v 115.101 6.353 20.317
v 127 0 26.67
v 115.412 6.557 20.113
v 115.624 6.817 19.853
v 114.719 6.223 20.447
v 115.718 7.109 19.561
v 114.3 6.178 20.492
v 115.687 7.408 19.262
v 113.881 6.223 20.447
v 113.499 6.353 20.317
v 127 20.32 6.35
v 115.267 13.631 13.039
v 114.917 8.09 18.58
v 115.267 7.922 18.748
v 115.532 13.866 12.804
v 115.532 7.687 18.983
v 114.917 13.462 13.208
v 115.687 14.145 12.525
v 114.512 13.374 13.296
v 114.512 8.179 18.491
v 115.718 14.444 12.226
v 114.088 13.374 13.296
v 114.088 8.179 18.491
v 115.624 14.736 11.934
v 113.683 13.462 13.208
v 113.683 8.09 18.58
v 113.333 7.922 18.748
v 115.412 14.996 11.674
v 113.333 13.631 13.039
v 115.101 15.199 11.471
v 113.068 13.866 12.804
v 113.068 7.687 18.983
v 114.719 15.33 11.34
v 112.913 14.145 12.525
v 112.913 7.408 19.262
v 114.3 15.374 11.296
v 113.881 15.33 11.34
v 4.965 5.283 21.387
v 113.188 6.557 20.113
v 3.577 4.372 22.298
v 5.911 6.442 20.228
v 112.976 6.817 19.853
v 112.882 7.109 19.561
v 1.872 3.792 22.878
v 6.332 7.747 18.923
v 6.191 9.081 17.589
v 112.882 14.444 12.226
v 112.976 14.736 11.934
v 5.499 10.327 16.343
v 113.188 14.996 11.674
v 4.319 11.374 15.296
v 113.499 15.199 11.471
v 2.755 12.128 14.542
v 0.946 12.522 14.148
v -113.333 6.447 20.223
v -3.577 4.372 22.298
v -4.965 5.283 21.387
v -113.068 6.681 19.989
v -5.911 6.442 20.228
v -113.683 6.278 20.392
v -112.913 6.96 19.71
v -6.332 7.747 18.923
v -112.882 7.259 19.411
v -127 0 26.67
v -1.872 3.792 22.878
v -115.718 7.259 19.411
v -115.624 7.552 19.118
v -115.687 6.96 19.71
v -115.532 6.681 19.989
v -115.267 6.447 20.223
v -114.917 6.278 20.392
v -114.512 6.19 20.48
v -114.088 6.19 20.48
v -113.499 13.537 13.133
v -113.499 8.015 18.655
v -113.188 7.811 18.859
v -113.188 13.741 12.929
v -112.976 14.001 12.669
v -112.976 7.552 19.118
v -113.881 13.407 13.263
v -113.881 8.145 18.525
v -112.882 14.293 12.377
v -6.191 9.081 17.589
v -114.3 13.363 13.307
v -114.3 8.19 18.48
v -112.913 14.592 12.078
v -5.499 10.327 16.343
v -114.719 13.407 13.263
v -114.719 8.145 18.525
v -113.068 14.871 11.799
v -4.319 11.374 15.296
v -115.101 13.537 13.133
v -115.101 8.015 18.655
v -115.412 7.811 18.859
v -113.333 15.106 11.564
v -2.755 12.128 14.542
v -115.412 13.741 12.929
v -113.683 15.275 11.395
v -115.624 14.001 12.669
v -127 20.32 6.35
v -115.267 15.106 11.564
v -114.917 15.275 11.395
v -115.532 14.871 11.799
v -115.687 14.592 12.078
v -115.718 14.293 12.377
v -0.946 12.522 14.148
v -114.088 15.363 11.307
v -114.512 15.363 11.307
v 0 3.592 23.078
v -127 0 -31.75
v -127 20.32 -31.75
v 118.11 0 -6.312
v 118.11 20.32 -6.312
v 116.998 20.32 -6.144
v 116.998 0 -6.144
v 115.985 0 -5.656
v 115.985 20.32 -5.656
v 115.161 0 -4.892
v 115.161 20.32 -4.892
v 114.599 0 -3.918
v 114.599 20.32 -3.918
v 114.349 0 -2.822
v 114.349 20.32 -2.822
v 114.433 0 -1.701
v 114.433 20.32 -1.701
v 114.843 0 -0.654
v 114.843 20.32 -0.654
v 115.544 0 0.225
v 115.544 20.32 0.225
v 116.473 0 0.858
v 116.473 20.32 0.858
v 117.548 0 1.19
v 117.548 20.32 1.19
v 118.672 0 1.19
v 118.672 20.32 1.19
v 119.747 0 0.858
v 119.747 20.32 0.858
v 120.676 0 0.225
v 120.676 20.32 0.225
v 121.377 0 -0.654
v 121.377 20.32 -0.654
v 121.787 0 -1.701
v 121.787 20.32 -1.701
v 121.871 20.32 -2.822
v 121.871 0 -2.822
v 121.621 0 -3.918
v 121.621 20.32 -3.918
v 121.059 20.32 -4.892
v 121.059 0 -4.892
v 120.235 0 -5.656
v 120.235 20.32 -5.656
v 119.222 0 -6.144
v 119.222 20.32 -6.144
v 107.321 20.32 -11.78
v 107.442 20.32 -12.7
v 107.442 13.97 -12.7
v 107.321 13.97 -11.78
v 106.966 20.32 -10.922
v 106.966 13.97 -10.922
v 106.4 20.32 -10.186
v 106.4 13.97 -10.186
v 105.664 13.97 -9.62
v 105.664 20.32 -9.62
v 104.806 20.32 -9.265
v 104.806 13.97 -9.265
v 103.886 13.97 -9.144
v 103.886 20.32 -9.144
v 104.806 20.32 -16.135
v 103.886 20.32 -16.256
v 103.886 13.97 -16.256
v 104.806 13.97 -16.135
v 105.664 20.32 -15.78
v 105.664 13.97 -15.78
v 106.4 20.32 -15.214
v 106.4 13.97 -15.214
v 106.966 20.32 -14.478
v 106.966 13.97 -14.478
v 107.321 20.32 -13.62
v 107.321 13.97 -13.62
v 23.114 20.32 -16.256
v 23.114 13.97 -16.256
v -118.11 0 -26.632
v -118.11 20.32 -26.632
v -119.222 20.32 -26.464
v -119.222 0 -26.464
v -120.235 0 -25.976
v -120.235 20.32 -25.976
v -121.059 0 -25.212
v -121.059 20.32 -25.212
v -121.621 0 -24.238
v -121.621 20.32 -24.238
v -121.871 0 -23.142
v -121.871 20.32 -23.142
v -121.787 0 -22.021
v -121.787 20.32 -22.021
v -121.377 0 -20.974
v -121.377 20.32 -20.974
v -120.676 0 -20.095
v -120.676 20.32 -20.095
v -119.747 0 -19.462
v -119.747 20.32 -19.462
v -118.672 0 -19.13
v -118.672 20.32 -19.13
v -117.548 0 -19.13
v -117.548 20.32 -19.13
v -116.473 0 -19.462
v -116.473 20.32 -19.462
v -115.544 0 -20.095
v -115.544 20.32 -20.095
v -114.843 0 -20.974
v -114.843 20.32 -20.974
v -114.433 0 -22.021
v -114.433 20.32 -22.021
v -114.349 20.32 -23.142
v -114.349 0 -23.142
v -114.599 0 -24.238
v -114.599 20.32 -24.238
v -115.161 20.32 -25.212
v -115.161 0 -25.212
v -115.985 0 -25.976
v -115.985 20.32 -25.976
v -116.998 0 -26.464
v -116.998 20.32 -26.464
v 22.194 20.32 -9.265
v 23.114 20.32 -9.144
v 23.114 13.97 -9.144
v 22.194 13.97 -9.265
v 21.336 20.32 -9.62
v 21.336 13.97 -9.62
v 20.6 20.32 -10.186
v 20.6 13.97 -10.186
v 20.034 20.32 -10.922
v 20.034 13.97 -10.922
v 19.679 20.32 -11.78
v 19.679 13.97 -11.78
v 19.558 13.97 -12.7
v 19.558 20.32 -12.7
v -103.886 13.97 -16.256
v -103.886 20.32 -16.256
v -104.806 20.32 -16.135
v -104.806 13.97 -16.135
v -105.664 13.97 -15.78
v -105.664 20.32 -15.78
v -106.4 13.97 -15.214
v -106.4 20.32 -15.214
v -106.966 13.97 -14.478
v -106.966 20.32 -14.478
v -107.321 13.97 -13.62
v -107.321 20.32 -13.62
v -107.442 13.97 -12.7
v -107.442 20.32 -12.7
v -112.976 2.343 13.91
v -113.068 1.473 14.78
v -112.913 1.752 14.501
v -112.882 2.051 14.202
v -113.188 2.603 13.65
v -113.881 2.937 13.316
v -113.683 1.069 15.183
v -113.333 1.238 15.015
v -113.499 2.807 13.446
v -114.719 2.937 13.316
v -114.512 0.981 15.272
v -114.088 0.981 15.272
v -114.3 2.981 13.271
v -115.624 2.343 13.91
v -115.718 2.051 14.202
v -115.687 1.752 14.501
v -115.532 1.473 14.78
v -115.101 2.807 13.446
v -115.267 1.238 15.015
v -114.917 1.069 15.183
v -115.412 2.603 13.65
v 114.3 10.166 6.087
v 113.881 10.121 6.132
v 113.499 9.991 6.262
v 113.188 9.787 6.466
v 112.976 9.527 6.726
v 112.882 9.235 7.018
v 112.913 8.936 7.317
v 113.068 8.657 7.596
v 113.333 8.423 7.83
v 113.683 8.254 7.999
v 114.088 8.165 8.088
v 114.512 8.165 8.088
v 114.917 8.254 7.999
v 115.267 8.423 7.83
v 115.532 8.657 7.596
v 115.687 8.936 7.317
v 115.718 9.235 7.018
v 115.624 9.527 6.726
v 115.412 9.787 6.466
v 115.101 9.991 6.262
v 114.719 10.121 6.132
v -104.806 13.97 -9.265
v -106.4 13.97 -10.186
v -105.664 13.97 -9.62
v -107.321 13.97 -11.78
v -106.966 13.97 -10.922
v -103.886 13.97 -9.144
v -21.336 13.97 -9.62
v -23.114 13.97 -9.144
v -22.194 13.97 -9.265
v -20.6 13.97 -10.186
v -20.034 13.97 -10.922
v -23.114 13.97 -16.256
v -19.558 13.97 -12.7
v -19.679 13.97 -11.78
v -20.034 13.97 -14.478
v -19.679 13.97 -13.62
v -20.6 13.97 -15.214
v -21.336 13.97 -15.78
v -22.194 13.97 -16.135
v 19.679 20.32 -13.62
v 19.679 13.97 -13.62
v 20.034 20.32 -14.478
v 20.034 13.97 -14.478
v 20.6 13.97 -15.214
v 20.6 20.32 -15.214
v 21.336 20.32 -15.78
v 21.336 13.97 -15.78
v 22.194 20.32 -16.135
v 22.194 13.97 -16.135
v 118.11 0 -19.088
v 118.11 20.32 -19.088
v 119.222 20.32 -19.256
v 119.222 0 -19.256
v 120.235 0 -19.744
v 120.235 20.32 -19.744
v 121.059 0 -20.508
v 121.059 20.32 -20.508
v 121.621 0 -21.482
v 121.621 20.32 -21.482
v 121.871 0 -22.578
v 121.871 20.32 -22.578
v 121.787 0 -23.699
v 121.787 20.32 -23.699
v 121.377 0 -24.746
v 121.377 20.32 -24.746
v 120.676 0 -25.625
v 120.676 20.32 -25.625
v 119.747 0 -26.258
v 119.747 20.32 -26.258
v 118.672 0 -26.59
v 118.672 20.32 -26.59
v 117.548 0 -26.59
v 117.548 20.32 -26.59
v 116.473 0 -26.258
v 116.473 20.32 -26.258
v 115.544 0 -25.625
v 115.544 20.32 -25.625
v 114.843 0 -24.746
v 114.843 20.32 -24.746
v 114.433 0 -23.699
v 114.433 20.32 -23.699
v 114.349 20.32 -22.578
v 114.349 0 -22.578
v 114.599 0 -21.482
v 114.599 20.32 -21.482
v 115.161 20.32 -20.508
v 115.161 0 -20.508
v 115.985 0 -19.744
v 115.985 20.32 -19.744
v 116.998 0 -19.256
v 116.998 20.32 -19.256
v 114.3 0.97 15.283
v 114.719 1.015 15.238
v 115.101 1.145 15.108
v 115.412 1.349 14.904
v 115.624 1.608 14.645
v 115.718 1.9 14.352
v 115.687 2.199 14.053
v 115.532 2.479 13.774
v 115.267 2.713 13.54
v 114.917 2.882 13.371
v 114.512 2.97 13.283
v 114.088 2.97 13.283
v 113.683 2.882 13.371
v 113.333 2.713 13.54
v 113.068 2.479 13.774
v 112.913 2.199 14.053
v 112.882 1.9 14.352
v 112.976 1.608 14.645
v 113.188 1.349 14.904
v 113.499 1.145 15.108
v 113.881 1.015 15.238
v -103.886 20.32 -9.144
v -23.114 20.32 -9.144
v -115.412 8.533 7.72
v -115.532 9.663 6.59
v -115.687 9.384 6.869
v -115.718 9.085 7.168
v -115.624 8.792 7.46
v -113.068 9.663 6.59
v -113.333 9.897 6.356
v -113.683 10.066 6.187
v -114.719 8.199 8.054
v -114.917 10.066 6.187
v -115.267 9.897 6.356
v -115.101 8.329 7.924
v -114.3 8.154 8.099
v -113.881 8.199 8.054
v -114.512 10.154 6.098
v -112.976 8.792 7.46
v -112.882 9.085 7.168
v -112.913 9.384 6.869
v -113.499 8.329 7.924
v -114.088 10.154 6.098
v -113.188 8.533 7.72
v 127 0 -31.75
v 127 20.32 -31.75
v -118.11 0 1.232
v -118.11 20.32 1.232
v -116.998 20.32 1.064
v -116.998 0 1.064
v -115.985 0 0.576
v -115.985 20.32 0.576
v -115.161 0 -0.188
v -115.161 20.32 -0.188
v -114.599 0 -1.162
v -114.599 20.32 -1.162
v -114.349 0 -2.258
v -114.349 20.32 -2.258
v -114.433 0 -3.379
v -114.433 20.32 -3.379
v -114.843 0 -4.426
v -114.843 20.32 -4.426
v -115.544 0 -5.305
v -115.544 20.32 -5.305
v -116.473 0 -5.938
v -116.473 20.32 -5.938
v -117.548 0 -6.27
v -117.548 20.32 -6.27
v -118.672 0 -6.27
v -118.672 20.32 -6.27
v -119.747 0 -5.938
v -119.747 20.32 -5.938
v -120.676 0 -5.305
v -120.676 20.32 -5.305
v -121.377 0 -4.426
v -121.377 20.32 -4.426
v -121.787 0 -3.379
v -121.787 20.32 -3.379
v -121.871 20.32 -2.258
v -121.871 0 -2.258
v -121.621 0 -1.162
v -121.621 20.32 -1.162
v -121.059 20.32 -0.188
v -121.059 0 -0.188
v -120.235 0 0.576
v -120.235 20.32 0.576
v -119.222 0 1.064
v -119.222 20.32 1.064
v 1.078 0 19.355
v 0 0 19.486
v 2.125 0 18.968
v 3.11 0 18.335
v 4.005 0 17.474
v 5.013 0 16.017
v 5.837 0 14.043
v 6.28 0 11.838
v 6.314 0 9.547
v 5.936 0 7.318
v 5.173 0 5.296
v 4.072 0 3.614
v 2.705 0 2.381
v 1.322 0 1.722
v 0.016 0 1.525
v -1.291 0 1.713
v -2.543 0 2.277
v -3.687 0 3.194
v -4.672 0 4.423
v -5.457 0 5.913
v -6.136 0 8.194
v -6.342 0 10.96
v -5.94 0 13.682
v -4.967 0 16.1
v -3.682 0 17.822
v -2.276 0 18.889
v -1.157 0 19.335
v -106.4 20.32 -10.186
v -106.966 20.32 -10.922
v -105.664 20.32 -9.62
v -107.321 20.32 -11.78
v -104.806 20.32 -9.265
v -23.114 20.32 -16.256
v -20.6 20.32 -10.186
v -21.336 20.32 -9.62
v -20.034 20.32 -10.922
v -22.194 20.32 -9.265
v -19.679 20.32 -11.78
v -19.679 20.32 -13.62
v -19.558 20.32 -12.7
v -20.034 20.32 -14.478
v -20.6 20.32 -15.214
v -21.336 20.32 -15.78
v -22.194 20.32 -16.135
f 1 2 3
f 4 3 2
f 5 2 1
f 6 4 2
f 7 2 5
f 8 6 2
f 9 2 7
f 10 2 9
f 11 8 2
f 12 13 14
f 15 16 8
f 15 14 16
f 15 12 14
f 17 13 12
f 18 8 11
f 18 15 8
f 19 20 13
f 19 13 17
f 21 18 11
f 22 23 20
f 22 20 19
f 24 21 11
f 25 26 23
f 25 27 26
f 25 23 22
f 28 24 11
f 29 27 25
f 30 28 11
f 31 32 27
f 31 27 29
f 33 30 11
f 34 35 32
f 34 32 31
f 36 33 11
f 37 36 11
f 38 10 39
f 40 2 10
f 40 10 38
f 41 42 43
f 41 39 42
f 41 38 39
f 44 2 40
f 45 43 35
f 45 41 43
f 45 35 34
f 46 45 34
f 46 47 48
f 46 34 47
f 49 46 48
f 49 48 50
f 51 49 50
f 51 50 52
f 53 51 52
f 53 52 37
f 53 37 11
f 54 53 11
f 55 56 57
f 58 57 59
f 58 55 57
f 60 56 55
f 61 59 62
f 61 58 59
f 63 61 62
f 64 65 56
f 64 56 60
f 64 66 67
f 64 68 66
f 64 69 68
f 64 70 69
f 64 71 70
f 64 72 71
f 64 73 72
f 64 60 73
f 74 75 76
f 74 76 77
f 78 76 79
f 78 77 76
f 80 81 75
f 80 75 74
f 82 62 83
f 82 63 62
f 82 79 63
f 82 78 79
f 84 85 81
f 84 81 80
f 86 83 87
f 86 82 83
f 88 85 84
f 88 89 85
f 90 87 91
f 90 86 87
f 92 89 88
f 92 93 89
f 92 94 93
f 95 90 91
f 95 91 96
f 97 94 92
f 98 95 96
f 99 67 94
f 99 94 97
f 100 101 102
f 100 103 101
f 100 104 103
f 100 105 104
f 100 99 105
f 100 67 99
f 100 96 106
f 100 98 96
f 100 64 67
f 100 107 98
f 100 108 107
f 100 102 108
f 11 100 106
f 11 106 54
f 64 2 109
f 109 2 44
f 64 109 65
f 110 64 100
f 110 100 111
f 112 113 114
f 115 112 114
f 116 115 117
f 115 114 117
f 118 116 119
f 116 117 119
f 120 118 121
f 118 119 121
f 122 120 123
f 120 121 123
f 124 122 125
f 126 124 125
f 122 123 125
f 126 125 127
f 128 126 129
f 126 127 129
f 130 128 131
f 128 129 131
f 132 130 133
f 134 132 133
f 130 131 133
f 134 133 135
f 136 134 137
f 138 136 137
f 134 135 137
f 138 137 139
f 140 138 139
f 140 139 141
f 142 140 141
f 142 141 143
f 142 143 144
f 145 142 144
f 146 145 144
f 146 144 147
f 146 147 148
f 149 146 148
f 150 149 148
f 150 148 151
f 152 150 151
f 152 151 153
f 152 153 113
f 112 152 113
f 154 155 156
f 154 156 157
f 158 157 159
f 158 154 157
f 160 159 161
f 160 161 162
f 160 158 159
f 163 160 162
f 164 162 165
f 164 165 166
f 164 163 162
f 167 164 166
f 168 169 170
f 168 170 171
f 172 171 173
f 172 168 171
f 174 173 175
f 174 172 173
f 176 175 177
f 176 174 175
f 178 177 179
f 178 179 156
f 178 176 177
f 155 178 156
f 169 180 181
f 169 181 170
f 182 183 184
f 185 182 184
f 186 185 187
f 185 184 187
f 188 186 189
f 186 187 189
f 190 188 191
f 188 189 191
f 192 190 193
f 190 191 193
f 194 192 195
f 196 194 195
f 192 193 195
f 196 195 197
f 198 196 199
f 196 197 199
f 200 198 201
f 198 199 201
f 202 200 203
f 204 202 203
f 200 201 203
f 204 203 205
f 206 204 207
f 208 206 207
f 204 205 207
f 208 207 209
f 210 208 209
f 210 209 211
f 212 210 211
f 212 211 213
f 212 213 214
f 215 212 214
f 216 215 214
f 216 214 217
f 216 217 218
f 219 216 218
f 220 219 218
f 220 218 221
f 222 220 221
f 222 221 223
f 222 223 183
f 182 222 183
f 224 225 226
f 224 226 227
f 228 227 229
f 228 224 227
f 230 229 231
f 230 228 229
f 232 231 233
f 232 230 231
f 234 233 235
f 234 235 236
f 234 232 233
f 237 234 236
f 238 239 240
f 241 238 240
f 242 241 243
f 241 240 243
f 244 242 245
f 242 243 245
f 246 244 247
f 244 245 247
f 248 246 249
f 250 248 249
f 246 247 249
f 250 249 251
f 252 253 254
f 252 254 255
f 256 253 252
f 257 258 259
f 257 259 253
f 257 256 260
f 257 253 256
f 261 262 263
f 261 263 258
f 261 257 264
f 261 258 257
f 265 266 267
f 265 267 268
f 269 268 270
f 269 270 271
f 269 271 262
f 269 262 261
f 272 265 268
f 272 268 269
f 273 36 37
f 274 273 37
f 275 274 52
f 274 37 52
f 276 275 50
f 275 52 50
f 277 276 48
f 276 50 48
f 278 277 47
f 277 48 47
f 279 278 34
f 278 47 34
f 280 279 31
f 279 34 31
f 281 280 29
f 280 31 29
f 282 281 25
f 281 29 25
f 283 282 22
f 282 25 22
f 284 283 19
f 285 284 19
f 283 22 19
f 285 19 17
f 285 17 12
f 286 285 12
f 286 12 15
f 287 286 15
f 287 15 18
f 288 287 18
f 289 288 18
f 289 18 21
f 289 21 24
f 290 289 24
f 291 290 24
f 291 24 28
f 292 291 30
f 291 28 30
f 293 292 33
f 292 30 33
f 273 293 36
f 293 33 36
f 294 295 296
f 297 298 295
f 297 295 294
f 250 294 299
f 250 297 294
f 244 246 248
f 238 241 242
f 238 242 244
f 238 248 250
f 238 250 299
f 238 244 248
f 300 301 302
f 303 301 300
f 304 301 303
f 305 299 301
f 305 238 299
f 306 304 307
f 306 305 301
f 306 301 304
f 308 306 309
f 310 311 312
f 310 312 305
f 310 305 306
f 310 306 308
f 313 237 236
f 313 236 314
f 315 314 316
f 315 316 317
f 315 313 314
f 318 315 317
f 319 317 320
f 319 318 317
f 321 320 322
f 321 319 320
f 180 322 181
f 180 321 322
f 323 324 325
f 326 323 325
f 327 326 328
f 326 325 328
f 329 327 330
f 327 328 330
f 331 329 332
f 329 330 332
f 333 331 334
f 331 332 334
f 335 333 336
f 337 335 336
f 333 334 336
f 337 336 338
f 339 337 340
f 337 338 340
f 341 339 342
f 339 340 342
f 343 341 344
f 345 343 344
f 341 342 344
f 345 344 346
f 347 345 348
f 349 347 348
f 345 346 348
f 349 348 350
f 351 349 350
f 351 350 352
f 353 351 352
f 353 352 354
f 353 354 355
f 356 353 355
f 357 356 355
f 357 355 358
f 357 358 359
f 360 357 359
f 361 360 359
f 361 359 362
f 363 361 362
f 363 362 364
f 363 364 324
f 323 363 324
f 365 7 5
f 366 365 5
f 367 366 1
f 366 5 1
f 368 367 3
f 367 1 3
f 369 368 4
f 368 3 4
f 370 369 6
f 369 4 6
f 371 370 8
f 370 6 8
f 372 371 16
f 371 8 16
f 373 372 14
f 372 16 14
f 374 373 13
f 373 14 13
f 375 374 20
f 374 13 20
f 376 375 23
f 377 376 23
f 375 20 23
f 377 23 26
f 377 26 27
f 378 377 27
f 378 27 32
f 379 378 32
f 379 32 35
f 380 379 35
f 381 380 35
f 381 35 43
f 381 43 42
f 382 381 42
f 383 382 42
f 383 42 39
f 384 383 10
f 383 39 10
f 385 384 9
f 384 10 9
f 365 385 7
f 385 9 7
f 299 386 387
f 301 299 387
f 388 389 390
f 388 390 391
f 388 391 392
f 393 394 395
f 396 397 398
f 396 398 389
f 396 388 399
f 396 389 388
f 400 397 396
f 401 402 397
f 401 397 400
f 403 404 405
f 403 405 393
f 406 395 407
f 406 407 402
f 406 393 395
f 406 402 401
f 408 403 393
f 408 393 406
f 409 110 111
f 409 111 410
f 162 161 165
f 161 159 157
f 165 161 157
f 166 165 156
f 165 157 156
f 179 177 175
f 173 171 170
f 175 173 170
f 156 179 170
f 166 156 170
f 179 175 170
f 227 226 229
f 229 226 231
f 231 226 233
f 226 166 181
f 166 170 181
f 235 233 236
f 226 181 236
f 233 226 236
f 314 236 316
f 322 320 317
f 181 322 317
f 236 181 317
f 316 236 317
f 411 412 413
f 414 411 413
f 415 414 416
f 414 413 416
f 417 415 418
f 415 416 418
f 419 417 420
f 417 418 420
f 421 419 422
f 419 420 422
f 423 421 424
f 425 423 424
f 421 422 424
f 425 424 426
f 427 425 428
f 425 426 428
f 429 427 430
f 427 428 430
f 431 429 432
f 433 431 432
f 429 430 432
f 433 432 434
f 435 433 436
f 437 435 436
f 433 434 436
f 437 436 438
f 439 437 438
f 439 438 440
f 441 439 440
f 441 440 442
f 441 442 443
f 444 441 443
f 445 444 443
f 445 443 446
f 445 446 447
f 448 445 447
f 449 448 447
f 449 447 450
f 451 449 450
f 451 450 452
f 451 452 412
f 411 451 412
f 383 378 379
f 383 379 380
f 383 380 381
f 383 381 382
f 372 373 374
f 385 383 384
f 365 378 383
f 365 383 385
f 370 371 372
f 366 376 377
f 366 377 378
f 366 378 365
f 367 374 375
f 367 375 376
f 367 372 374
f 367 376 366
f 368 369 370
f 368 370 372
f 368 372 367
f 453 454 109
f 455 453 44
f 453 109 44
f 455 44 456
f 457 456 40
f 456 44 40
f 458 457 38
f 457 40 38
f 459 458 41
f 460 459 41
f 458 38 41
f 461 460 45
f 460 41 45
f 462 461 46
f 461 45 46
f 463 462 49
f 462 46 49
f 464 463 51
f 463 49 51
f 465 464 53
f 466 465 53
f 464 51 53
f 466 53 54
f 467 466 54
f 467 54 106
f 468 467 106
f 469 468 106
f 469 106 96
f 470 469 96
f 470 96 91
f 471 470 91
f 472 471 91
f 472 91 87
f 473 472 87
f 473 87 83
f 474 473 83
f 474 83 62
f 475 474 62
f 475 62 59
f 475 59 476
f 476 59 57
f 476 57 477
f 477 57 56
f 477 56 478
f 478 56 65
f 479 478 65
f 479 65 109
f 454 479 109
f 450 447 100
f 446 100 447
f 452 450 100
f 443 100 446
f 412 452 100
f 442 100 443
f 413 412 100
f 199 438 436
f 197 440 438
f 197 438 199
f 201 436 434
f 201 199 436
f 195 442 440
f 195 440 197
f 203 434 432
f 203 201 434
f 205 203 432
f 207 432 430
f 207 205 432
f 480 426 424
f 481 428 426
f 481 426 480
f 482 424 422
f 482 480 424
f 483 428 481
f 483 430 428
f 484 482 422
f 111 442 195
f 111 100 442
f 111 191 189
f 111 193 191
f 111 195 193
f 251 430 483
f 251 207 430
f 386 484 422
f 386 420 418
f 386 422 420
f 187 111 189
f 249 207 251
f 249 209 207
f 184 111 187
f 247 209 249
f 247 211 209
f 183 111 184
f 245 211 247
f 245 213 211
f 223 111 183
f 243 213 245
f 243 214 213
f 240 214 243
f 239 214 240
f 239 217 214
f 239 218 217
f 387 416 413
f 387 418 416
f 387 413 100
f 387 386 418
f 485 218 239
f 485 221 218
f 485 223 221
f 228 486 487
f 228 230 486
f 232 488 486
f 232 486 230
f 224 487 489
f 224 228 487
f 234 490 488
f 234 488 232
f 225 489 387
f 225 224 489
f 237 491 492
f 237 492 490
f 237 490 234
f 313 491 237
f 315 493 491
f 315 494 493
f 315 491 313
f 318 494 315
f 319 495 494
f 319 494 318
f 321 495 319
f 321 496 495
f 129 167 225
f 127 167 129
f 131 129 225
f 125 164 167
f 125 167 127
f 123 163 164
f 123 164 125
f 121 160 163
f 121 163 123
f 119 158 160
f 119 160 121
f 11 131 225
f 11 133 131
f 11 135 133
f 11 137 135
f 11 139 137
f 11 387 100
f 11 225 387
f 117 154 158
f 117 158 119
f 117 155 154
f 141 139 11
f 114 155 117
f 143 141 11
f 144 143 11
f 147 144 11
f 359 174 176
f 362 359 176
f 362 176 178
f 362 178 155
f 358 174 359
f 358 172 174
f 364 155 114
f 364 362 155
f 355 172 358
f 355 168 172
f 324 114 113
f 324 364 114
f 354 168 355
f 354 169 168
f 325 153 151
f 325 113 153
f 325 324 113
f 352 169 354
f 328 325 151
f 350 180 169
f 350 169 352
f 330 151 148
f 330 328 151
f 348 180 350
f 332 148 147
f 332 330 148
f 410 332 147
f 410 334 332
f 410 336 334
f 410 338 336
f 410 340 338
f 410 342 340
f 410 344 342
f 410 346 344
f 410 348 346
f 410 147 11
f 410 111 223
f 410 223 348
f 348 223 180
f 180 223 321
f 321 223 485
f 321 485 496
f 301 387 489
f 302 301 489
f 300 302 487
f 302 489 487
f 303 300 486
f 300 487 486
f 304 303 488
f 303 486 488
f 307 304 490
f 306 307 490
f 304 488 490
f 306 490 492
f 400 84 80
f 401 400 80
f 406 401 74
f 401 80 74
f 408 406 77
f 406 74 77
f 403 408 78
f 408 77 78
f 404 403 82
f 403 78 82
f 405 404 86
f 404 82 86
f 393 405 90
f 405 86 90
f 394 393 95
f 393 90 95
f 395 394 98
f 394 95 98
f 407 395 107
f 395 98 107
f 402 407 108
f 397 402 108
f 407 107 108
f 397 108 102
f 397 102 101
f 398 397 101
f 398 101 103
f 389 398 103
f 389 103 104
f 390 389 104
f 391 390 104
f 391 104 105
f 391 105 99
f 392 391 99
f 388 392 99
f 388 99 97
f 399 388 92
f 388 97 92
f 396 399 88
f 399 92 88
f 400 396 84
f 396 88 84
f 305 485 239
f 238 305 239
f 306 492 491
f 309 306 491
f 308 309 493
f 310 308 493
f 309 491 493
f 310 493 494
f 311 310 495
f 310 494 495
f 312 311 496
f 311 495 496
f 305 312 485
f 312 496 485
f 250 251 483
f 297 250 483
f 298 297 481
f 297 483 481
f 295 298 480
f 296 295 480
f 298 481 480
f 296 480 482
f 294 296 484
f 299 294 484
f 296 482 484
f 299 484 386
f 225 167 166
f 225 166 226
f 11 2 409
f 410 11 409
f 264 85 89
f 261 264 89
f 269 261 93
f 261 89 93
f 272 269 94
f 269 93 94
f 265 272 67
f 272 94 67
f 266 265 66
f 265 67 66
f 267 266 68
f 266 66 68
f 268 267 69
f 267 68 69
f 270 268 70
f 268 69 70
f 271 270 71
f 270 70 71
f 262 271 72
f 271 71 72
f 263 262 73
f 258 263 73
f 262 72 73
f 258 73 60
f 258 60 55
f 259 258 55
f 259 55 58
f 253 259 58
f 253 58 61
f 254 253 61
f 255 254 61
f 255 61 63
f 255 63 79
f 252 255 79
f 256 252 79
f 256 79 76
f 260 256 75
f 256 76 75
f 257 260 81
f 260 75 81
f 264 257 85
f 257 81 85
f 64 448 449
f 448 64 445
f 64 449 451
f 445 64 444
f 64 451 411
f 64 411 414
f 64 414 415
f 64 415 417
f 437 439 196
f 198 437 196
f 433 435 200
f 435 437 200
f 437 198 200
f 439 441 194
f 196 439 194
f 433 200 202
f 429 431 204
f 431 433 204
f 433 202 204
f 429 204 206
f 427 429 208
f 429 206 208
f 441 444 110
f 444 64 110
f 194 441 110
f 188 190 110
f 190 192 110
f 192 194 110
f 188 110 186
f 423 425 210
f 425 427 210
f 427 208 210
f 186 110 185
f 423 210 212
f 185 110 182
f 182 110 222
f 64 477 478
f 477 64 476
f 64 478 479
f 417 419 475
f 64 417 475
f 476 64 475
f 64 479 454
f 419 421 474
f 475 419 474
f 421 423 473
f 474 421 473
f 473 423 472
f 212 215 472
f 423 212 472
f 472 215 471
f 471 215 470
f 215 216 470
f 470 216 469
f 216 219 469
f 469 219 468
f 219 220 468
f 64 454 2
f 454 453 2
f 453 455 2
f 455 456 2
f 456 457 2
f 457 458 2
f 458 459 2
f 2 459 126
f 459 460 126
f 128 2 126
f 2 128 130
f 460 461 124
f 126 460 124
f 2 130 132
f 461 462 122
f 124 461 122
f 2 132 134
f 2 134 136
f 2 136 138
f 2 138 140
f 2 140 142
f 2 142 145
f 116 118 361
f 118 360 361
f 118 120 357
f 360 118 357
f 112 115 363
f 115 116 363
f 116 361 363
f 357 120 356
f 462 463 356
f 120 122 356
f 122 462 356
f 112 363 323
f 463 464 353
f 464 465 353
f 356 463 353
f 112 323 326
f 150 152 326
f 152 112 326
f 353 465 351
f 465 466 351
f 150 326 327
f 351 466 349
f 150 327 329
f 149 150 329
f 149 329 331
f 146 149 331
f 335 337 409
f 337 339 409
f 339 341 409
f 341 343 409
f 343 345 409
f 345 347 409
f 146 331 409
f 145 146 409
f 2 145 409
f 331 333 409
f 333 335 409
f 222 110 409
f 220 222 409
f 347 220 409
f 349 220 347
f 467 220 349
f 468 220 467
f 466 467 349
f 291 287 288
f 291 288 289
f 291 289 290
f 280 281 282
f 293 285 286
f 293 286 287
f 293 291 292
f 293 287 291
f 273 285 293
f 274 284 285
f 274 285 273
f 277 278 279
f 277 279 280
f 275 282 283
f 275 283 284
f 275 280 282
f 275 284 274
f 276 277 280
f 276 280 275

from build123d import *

# Parameters (mm, degrees)
SKETCH1_W           = 254
SKETCH1_H           = 63.5
BOSS_EXTRUDE1_DEPTH = 20.32
CHAMFER1_SIZE       = 25.4
CUT_EXTRUDE1_DEPTH  = 6.35
SKETCH3_R           = 3.7719
CUT_EXTRUDE2_DEPTH  = 133.476280518
SKETCH4_R           = 1.4224
CUT_EXTRUDE3_DEPTH  = 7.366
SKETCH5_R           = 6.35
CUT_EXTRUDE4_DEPTH  = 136.423334215


with BuildPart() as part:
    # Sketch1 → Boss-Extrude1 (new body)
    with BuildSketch(Plane(origin=(0, 0, 0), x_dir=(1, 0, 0), z_dir=(0, 1, 0))):
        Rectangle(SKETCH1_W, SKETCH1_H)
    extrude(amount=BOSS_EXTRUDE1_DEPTH)

    # Chamfer1
    # the kernel refuses this chamfer: 25.4 mm, written as the material it takes off along each edge
    with BuildSketch(Plane(origin=(-192.320747894, 20.32, 31.75), x_dir=(0, -0.9996219169112966, 0.02749587661058647), z_dir=(1, 0, 0))) as chamfer1_piece_1:
        Polygon((CHAMFER1_SIZE * 0.999621916911, CHAMFER1_SIZE * 0.0274958766106), (-CHAMFER1_SIZE * 0.0274958766106, CHAMFER1_SIZE * 0.999621916911), (0, 0), align=None)
    extrude(amount=384.641495789, mode=Mode.SUBTRACT)

    # Sketch2 → Cut-Extrude1 (cut)
    with BuildSketch(Plane(origin=(0, 20.32, 0), x_dir=(1, 0, 0), z_dir=(0, 1, 0))):
        with BuildLine():
            ThreePointArc((-107.442, 12.7), (-106.400471714, 10.185528286), (-103.886, 9.144))
            Line((-103.886, 9.144), (-23.114, 9.144))
            ThreePointArc((-23.114, 9.144), (-20.599528286, 10.185528286), (-19.558, 12.7))
            ThreePointArc((-19.558, 12.7), (-20.599528286, 15.214471714), (-23.114, 16.256))
            Line((-23.114, 16.256), (-103.886, 16.256))
            ThreePointArc((-103.886, 16.256), (-106.400471714, 15.214471714), (-107.442, 12.7))
        make_face()
    cut_extrude1 = extrude(amount=-CUT_EXTRUDE1_DEPTH, mode=Mode.SUBTRACT)

    # Sketch3 → Cut-Extrude2 (cut, through all)
    with BuildSketch(Plane(origin=(0, 20.32, 0), x_dir=(1, 0, 0), z_dir=(0, 1, 0))):
        with Locations(Location((-118.11, 2.54, 0), (0, 0, 270))):
            Circle(SKETCH3_R)
        with Locations(Location((-118.11, 22.86, 0), (0, 0, 90))):
            Circle(SKETCH3_R)
        with Locations(Location((118.11, 2.54, 0), (0, 0, 90))):
            Circle(SKETCH3_R)
        with Locations(Location((118.11, 22.86, 0), (0, 0, 270))):
            Circle(SKETCH3_R)
    extrude(amount=-CUT_EXTRUDE2_DEPTH, mode=Mode.SUBTRACT)

    # Mirror1: Cut-Extrude1 across plane
    add(cut_extrude1.mirror(Plane.ZY), mode=Mode.SUBTRACT)

    # Sketch4 → Cut-Extrude3 (cut)
    with BuildSketch(Plane(origin=(0, 13.335, 13.335), x_dir=(1, 0, 0), z_dir=(0, 0.7071067811865464, 0.7071067811865487))):
        with Locations(Location((-114.3, -8.698537854, 0), (0, 0, 90))):
            Circle(SKETCH4_R)
        with Locations(Location((-114.3, 1.461462146, 0), (0, 0, 270))):
            Circle(SKETCH4_R)
        with Locations(Location((114.3, -8.698537854, 0), (0, 0, 270))):
            Circle(SKETCH4_R)
        with Locations(Location((114.3, 1.461462146, 0), (0, 0, 90))):
            Circle(SKETCH4_R)
    extrude(amount=-CUT_EXTRUDE3_DEPTH, mode=Mode.SUBTRACT)

    # Sketch5 → Cut-Extrude4 (cut, through all)
    with BuildSketch(Plane(origin=(0, 13.335, 13.335), x_dir=(1, 0, 0), z_dir=(0, 0.7071067811865511, 0.707106781186544))):
        with Locations(Location((0, -7.428537854, 0), (0, 0, 270))):
            Circle(SKETCH5_R)
    extrude(amount=-CUT_EXTRUDE4_DEPTH, mode=Mode.SUBTRACT)


solid = part.part
